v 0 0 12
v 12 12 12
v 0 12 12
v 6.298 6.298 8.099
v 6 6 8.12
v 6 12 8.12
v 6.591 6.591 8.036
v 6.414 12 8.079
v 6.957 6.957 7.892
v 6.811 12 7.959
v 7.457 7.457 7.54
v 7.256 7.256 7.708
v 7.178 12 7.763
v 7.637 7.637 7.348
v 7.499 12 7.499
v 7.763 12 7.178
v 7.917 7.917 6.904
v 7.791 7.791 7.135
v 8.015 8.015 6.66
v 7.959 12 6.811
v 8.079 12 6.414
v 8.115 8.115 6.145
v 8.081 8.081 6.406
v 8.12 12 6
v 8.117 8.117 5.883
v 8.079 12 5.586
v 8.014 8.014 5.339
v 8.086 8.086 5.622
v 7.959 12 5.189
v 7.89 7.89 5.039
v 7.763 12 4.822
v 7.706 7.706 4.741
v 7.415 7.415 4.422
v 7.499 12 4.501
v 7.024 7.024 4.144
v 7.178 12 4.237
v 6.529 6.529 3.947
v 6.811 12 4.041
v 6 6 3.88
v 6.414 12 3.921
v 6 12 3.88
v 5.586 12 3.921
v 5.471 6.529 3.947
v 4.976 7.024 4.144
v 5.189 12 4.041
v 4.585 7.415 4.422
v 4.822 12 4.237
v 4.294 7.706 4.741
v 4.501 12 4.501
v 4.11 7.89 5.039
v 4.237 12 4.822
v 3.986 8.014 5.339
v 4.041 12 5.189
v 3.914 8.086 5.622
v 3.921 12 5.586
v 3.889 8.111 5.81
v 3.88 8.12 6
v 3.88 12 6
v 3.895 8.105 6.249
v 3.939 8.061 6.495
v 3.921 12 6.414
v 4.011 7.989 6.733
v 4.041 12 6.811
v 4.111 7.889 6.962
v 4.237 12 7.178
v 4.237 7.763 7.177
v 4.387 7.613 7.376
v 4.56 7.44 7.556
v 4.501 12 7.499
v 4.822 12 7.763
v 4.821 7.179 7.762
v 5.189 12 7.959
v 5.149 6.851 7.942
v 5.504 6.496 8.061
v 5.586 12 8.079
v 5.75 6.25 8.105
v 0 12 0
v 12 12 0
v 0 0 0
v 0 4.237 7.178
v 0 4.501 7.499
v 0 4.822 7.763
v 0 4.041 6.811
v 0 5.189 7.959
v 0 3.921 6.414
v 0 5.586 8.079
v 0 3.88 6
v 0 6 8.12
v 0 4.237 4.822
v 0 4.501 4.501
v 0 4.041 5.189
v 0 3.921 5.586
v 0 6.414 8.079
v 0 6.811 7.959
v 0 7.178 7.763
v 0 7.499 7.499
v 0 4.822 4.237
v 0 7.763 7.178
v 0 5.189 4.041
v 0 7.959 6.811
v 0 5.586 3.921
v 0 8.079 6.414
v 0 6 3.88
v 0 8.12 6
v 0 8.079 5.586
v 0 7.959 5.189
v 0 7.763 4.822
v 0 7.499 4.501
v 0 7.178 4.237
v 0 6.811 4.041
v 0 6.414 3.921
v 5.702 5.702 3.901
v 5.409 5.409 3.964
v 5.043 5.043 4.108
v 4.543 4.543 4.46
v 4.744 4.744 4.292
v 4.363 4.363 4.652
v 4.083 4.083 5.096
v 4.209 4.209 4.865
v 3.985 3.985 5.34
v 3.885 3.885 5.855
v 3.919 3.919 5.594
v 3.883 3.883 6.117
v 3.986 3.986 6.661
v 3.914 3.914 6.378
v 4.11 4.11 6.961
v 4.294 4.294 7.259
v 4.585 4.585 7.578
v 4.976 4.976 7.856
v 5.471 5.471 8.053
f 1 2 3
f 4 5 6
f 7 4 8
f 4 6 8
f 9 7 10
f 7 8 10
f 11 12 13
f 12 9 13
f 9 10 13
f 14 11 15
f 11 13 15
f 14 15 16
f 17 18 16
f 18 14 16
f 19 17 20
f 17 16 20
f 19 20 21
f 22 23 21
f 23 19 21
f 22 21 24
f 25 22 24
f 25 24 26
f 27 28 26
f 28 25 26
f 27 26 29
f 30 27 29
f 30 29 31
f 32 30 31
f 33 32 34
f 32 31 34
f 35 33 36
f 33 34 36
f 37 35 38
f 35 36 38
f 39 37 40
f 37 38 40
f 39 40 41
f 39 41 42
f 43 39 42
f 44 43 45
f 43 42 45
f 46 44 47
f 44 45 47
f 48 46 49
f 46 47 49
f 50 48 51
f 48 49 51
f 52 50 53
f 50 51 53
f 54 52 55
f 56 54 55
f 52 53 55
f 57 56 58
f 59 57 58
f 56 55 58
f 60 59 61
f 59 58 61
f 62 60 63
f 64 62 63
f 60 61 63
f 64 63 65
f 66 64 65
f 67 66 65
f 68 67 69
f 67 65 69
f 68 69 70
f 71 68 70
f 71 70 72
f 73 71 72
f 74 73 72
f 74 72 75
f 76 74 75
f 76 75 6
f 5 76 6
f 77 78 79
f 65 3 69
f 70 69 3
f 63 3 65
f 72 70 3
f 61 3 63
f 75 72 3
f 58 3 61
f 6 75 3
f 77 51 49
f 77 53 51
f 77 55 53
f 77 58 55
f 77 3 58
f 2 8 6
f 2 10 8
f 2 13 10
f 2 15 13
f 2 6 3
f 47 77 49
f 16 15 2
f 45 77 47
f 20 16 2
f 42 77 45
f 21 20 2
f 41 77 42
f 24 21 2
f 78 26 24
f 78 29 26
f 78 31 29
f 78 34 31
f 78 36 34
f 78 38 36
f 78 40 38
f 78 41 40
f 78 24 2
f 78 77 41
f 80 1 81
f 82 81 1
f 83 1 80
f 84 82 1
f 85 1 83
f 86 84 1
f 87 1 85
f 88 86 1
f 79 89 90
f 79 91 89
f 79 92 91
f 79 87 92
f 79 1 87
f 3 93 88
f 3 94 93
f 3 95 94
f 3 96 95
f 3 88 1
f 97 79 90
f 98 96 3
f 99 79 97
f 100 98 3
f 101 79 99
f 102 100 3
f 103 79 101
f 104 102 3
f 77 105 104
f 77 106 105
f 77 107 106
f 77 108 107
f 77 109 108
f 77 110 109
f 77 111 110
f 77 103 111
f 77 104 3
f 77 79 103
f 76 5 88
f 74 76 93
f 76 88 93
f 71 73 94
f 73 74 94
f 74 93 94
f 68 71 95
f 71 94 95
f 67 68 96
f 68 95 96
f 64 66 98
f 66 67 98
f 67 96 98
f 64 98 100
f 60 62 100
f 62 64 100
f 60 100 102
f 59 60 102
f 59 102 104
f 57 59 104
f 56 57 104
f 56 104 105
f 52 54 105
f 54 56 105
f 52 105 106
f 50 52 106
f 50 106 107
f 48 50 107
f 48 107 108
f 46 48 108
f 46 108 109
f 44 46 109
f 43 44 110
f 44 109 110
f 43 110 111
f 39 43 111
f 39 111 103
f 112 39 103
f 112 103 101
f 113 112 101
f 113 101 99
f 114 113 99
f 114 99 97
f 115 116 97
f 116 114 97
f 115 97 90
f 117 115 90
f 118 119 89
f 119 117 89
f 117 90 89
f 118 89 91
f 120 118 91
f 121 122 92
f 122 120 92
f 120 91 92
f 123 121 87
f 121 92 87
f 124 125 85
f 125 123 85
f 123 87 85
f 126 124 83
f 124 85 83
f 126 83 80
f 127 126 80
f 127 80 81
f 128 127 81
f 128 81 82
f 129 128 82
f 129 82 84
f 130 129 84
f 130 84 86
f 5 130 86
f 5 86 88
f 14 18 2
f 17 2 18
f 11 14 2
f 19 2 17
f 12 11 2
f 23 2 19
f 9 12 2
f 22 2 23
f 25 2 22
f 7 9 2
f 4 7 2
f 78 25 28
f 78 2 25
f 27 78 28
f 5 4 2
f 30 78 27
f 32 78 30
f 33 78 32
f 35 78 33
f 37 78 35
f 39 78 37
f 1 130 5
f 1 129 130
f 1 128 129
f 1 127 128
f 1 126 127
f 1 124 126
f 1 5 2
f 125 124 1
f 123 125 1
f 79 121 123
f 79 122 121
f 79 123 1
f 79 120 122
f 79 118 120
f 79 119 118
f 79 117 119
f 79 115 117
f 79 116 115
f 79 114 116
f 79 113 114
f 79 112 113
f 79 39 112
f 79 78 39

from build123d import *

# Parameters (mm, degrees)
BOSS_EXTRU_1_DEPTH      = 12
ESQUISSE2_R             = 2.12
ENL_V_MAT_EXTRU_1_DEPTH = 12
ESQUISSE3_R             = 2.12
ENL_V_MAT_EXTRU_2_DEPTH = 12


with BuildPart() as part:
    # Esquisse1 → Boss.-Extru.1 (new body)
    with BuildSketch(Plane.XY):
        Polygon((0, 0), (0, 12), (12, 12), align=None)
    extrude(amount=BOSS_EXTRU_1_DEPTH)

    # Esquisse2 → Enlèv. mat.-Extru.1 (cut)
    with BuildSketch(Plane(origin=(0, 12, 0), x_dir=(1, 0, 0), z_dir=(0, 1, 0))):
        with Locations(Location((6, -6, 0), (0, 0, 270))):
            Circle(ESQUISSE2_R)
    extrude(amount=-ENL_V_MAT_EXTRU_1_DEPTH, mode=Mode.SUBTRACT)

    # Esquisse3 → Enlèv. mat.-Extru.2 (cut)
    with BuildSketch(Plane.ZY):
        with Locations((6, 6)):
            Circle(ESQUISSE3_R)
    extrude(amount=-ENL_V_MAT_EXTRU_2_DEPTH, mode=Mode.SUBTRACT)


solid = part.part
